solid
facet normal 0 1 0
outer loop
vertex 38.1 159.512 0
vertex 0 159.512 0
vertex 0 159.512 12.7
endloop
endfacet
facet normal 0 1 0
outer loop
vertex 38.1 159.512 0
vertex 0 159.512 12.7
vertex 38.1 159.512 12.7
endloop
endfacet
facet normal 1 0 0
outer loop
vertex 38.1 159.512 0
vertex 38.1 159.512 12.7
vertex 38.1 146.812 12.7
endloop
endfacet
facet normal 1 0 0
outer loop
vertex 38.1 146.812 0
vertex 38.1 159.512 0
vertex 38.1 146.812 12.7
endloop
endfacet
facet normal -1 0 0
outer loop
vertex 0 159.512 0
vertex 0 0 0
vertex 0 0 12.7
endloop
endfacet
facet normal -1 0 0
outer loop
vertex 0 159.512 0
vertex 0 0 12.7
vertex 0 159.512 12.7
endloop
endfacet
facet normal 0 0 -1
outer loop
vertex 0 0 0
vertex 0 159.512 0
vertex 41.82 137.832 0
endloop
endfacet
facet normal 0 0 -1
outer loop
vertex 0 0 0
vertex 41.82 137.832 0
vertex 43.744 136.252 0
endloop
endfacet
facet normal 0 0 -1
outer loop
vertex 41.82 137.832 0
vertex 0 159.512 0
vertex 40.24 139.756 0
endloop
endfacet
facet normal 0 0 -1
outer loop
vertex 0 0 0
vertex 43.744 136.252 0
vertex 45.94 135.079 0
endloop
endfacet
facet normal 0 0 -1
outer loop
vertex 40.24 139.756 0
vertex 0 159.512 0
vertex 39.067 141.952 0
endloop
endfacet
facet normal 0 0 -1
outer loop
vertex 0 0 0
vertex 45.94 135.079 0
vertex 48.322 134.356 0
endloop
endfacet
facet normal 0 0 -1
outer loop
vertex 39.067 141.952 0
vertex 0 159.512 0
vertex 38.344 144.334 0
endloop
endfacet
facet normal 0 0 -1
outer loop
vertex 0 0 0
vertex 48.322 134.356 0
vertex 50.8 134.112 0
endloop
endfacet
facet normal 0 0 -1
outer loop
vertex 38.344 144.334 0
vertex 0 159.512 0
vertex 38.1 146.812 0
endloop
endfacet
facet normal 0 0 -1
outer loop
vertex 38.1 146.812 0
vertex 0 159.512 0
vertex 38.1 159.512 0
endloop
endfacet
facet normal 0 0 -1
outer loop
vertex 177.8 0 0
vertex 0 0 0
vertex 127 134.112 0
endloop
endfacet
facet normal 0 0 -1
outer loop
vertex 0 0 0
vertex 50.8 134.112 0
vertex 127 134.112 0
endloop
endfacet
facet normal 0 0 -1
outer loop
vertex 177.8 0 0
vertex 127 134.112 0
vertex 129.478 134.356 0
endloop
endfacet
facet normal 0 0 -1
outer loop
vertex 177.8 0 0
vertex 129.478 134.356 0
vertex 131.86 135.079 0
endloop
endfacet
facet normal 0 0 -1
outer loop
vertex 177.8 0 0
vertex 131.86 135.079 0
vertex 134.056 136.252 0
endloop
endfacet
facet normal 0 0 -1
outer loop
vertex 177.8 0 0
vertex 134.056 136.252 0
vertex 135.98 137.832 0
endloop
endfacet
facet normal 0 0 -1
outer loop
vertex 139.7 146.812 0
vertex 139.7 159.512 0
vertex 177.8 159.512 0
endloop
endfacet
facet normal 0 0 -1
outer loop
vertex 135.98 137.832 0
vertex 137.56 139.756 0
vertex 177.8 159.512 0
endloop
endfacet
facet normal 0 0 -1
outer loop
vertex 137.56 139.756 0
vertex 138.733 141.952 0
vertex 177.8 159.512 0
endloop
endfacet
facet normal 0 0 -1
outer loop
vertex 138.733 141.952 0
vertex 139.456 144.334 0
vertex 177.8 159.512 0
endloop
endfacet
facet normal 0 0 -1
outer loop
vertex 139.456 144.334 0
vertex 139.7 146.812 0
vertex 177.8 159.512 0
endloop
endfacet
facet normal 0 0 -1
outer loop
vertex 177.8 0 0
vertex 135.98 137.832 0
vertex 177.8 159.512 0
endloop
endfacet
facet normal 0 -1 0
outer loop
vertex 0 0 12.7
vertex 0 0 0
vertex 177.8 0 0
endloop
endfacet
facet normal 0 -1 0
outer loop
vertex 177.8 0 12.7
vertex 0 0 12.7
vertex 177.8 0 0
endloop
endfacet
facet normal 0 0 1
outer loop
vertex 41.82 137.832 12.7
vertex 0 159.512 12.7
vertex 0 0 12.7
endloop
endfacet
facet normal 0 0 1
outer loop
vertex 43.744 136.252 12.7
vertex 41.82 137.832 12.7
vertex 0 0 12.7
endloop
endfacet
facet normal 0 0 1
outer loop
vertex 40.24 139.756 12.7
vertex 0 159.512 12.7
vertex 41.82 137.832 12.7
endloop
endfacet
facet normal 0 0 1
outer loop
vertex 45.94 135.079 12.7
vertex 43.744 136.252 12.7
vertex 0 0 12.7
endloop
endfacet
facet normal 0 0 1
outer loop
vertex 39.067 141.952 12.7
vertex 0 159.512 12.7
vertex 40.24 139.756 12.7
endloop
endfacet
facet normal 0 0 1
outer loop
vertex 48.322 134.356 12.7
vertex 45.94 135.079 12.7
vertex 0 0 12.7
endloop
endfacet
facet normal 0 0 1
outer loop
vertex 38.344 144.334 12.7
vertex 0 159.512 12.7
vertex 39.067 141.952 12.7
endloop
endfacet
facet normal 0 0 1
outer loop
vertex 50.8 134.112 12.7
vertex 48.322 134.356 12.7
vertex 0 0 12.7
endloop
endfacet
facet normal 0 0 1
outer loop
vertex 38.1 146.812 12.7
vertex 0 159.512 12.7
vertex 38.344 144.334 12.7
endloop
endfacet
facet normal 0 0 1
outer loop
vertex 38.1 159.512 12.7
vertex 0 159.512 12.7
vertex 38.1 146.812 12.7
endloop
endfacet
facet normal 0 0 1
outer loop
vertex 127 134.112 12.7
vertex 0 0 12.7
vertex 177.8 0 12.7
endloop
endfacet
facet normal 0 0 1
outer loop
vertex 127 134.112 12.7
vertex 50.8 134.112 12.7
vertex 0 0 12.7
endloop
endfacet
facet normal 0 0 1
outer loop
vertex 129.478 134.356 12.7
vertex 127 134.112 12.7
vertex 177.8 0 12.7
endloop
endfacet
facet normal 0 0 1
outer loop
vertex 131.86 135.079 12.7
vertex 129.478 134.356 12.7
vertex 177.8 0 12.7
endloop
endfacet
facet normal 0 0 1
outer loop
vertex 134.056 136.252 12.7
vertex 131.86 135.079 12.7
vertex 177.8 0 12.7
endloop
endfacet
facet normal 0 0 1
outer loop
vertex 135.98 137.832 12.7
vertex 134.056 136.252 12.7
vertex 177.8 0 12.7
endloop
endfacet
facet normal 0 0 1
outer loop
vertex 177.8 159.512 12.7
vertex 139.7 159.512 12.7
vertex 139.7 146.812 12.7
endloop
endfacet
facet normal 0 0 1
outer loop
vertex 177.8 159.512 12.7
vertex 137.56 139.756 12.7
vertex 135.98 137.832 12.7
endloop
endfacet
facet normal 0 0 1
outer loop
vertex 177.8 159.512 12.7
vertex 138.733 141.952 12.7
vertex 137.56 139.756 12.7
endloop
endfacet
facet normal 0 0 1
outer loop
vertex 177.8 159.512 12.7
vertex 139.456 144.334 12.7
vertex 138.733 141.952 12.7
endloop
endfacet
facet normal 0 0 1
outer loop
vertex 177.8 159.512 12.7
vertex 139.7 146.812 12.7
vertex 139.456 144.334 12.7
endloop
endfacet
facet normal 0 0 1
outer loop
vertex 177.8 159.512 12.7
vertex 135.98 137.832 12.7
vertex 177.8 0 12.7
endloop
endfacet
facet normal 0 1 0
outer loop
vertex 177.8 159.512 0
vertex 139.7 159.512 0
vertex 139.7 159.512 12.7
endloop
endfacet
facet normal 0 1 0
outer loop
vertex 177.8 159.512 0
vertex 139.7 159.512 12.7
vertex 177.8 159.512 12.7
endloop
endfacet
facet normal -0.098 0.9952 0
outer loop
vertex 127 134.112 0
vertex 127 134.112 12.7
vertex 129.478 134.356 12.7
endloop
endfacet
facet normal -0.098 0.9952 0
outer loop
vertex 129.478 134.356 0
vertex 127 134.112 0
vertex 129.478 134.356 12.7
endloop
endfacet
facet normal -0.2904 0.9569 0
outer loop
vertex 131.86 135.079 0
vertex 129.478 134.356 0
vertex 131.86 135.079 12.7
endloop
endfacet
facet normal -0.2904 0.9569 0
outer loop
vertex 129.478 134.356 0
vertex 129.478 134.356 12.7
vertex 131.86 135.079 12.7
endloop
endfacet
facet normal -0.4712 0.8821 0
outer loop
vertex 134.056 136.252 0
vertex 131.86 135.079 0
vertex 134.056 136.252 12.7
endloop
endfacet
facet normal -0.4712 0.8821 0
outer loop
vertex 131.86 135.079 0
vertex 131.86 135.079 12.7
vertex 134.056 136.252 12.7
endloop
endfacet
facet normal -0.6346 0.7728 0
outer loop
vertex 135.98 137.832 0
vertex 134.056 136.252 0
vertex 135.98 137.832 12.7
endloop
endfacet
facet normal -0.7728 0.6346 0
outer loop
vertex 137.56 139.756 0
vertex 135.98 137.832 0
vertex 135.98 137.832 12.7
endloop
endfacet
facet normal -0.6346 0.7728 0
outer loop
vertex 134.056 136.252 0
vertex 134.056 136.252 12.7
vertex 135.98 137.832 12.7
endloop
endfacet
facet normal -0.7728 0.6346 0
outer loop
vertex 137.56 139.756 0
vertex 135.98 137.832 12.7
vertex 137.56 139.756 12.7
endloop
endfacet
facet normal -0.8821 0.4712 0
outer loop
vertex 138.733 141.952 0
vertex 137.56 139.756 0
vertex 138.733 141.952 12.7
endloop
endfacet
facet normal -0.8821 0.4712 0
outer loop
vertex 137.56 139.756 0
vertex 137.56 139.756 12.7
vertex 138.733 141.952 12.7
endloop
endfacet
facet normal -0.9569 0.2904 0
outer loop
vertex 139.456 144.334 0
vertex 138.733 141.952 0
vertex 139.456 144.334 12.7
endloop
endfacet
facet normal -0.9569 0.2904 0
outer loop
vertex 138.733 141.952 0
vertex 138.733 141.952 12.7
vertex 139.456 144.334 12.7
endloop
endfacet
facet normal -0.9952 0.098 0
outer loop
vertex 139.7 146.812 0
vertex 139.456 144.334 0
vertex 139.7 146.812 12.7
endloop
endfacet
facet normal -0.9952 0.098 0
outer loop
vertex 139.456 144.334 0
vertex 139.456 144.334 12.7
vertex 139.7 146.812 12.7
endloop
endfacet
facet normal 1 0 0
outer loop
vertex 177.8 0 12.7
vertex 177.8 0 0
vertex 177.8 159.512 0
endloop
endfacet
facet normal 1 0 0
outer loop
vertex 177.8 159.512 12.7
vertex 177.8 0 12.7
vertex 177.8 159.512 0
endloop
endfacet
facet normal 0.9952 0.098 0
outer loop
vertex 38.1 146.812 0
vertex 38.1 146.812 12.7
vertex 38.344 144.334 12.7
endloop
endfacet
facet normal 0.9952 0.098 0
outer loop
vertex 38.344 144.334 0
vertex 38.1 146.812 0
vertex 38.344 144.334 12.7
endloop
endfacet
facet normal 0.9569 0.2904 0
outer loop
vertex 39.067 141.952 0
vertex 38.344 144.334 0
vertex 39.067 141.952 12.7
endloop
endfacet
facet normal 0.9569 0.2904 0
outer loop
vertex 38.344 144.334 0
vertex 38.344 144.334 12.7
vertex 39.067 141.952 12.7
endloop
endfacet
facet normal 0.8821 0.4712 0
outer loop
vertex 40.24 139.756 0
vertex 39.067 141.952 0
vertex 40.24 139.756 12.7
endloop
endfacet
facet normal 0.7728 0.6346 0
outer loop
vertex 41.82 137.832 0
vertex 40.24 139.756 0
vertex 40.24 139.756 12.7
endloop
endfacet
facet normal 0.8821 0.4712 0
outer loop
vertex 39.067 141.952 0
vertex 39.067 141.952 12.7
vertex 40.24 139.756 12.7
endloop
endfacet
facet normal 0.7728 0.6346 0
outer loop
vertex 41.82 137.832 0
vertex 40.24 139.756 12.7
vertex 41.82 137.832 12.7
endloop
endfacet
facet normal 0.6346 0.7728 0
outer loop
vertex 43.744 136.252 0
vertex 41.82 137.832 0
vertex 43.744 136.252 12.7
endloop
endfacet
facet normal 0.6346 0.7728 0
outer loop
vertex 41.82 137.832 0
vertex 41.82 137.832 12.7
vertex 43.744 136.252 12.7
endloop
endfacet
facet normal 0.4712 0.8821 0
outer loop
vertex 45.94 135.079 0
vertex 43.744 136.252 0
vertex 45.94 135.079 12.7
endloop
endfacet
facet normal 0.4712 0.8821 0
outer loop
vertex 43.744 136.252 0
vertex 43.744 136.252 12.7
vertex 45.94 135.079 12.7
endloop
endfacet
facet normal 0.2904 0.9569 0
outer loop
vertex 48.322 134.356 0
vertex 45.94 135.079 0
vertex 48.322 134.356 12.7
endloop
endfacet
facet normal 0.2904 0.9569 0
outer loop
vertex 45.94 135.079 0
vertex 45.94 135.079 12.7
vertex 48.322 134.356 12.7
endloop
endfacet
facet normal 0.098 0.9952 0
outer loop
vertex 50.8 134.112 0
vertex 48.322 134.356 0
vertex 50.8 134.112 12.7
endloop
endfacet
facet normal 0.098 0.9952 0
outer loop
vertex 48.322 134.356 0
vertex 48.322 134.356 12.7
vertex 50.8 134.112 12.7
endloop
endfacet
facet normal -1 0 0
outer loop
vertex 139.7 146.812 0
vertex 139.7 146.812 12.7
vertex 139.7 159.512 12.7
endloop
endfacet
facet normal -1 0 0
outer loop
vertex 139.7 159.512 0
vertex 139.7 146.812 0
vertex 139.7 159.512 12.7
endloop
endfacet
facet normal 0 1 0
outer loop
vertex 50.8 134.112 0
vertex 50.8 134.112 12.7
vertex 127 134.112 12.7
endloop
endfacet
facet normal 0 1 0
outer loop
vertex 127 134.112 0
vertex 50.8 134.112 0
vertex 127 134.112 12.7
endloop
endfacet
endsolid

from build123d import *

# Parameters (mm, degrees)
F0_W     = 177.8
F0_H     = 159.512
F1_DEPTH = 12.7
F3_DEPTH = 12.701


with BuildPart() as f1:
    # F0 (on Top) → F1 (new body)
    with BuildSketch(Plane.XY):
        with Locations((88.9, 79.756)):
            Rectangle(F0_W, F0_H)
    extrude(amount=F1_DEPTH)

    # F2 (on face) → F3 (cut, through all)
    with BuildSketch(Plane.XY.offset(12.7)):
        with BuildLine():
            Line((139.7, 159.512), (38.1, 159.512))
            Line((38.1, 159.512), (38.1, 146.812))
            ThreePointArc((38.1, 146.812), (41.819744, 137.831744), (50.8, 134.112))
            Line((50.8, 134.112), (88.9, 134.112))
            Line((88.9, 134.112), (127, 134.112))
            ThreePointArc((127, 134.112), (135.980256, 137.831744), (139.7, 146.812))
            Line((139.7, 146.812), (139.7, 159.512))
        make_face()
    extrude(amount=-F3_DEPTH, mode=Mode.SUBTRACT)


solid = f1.part
